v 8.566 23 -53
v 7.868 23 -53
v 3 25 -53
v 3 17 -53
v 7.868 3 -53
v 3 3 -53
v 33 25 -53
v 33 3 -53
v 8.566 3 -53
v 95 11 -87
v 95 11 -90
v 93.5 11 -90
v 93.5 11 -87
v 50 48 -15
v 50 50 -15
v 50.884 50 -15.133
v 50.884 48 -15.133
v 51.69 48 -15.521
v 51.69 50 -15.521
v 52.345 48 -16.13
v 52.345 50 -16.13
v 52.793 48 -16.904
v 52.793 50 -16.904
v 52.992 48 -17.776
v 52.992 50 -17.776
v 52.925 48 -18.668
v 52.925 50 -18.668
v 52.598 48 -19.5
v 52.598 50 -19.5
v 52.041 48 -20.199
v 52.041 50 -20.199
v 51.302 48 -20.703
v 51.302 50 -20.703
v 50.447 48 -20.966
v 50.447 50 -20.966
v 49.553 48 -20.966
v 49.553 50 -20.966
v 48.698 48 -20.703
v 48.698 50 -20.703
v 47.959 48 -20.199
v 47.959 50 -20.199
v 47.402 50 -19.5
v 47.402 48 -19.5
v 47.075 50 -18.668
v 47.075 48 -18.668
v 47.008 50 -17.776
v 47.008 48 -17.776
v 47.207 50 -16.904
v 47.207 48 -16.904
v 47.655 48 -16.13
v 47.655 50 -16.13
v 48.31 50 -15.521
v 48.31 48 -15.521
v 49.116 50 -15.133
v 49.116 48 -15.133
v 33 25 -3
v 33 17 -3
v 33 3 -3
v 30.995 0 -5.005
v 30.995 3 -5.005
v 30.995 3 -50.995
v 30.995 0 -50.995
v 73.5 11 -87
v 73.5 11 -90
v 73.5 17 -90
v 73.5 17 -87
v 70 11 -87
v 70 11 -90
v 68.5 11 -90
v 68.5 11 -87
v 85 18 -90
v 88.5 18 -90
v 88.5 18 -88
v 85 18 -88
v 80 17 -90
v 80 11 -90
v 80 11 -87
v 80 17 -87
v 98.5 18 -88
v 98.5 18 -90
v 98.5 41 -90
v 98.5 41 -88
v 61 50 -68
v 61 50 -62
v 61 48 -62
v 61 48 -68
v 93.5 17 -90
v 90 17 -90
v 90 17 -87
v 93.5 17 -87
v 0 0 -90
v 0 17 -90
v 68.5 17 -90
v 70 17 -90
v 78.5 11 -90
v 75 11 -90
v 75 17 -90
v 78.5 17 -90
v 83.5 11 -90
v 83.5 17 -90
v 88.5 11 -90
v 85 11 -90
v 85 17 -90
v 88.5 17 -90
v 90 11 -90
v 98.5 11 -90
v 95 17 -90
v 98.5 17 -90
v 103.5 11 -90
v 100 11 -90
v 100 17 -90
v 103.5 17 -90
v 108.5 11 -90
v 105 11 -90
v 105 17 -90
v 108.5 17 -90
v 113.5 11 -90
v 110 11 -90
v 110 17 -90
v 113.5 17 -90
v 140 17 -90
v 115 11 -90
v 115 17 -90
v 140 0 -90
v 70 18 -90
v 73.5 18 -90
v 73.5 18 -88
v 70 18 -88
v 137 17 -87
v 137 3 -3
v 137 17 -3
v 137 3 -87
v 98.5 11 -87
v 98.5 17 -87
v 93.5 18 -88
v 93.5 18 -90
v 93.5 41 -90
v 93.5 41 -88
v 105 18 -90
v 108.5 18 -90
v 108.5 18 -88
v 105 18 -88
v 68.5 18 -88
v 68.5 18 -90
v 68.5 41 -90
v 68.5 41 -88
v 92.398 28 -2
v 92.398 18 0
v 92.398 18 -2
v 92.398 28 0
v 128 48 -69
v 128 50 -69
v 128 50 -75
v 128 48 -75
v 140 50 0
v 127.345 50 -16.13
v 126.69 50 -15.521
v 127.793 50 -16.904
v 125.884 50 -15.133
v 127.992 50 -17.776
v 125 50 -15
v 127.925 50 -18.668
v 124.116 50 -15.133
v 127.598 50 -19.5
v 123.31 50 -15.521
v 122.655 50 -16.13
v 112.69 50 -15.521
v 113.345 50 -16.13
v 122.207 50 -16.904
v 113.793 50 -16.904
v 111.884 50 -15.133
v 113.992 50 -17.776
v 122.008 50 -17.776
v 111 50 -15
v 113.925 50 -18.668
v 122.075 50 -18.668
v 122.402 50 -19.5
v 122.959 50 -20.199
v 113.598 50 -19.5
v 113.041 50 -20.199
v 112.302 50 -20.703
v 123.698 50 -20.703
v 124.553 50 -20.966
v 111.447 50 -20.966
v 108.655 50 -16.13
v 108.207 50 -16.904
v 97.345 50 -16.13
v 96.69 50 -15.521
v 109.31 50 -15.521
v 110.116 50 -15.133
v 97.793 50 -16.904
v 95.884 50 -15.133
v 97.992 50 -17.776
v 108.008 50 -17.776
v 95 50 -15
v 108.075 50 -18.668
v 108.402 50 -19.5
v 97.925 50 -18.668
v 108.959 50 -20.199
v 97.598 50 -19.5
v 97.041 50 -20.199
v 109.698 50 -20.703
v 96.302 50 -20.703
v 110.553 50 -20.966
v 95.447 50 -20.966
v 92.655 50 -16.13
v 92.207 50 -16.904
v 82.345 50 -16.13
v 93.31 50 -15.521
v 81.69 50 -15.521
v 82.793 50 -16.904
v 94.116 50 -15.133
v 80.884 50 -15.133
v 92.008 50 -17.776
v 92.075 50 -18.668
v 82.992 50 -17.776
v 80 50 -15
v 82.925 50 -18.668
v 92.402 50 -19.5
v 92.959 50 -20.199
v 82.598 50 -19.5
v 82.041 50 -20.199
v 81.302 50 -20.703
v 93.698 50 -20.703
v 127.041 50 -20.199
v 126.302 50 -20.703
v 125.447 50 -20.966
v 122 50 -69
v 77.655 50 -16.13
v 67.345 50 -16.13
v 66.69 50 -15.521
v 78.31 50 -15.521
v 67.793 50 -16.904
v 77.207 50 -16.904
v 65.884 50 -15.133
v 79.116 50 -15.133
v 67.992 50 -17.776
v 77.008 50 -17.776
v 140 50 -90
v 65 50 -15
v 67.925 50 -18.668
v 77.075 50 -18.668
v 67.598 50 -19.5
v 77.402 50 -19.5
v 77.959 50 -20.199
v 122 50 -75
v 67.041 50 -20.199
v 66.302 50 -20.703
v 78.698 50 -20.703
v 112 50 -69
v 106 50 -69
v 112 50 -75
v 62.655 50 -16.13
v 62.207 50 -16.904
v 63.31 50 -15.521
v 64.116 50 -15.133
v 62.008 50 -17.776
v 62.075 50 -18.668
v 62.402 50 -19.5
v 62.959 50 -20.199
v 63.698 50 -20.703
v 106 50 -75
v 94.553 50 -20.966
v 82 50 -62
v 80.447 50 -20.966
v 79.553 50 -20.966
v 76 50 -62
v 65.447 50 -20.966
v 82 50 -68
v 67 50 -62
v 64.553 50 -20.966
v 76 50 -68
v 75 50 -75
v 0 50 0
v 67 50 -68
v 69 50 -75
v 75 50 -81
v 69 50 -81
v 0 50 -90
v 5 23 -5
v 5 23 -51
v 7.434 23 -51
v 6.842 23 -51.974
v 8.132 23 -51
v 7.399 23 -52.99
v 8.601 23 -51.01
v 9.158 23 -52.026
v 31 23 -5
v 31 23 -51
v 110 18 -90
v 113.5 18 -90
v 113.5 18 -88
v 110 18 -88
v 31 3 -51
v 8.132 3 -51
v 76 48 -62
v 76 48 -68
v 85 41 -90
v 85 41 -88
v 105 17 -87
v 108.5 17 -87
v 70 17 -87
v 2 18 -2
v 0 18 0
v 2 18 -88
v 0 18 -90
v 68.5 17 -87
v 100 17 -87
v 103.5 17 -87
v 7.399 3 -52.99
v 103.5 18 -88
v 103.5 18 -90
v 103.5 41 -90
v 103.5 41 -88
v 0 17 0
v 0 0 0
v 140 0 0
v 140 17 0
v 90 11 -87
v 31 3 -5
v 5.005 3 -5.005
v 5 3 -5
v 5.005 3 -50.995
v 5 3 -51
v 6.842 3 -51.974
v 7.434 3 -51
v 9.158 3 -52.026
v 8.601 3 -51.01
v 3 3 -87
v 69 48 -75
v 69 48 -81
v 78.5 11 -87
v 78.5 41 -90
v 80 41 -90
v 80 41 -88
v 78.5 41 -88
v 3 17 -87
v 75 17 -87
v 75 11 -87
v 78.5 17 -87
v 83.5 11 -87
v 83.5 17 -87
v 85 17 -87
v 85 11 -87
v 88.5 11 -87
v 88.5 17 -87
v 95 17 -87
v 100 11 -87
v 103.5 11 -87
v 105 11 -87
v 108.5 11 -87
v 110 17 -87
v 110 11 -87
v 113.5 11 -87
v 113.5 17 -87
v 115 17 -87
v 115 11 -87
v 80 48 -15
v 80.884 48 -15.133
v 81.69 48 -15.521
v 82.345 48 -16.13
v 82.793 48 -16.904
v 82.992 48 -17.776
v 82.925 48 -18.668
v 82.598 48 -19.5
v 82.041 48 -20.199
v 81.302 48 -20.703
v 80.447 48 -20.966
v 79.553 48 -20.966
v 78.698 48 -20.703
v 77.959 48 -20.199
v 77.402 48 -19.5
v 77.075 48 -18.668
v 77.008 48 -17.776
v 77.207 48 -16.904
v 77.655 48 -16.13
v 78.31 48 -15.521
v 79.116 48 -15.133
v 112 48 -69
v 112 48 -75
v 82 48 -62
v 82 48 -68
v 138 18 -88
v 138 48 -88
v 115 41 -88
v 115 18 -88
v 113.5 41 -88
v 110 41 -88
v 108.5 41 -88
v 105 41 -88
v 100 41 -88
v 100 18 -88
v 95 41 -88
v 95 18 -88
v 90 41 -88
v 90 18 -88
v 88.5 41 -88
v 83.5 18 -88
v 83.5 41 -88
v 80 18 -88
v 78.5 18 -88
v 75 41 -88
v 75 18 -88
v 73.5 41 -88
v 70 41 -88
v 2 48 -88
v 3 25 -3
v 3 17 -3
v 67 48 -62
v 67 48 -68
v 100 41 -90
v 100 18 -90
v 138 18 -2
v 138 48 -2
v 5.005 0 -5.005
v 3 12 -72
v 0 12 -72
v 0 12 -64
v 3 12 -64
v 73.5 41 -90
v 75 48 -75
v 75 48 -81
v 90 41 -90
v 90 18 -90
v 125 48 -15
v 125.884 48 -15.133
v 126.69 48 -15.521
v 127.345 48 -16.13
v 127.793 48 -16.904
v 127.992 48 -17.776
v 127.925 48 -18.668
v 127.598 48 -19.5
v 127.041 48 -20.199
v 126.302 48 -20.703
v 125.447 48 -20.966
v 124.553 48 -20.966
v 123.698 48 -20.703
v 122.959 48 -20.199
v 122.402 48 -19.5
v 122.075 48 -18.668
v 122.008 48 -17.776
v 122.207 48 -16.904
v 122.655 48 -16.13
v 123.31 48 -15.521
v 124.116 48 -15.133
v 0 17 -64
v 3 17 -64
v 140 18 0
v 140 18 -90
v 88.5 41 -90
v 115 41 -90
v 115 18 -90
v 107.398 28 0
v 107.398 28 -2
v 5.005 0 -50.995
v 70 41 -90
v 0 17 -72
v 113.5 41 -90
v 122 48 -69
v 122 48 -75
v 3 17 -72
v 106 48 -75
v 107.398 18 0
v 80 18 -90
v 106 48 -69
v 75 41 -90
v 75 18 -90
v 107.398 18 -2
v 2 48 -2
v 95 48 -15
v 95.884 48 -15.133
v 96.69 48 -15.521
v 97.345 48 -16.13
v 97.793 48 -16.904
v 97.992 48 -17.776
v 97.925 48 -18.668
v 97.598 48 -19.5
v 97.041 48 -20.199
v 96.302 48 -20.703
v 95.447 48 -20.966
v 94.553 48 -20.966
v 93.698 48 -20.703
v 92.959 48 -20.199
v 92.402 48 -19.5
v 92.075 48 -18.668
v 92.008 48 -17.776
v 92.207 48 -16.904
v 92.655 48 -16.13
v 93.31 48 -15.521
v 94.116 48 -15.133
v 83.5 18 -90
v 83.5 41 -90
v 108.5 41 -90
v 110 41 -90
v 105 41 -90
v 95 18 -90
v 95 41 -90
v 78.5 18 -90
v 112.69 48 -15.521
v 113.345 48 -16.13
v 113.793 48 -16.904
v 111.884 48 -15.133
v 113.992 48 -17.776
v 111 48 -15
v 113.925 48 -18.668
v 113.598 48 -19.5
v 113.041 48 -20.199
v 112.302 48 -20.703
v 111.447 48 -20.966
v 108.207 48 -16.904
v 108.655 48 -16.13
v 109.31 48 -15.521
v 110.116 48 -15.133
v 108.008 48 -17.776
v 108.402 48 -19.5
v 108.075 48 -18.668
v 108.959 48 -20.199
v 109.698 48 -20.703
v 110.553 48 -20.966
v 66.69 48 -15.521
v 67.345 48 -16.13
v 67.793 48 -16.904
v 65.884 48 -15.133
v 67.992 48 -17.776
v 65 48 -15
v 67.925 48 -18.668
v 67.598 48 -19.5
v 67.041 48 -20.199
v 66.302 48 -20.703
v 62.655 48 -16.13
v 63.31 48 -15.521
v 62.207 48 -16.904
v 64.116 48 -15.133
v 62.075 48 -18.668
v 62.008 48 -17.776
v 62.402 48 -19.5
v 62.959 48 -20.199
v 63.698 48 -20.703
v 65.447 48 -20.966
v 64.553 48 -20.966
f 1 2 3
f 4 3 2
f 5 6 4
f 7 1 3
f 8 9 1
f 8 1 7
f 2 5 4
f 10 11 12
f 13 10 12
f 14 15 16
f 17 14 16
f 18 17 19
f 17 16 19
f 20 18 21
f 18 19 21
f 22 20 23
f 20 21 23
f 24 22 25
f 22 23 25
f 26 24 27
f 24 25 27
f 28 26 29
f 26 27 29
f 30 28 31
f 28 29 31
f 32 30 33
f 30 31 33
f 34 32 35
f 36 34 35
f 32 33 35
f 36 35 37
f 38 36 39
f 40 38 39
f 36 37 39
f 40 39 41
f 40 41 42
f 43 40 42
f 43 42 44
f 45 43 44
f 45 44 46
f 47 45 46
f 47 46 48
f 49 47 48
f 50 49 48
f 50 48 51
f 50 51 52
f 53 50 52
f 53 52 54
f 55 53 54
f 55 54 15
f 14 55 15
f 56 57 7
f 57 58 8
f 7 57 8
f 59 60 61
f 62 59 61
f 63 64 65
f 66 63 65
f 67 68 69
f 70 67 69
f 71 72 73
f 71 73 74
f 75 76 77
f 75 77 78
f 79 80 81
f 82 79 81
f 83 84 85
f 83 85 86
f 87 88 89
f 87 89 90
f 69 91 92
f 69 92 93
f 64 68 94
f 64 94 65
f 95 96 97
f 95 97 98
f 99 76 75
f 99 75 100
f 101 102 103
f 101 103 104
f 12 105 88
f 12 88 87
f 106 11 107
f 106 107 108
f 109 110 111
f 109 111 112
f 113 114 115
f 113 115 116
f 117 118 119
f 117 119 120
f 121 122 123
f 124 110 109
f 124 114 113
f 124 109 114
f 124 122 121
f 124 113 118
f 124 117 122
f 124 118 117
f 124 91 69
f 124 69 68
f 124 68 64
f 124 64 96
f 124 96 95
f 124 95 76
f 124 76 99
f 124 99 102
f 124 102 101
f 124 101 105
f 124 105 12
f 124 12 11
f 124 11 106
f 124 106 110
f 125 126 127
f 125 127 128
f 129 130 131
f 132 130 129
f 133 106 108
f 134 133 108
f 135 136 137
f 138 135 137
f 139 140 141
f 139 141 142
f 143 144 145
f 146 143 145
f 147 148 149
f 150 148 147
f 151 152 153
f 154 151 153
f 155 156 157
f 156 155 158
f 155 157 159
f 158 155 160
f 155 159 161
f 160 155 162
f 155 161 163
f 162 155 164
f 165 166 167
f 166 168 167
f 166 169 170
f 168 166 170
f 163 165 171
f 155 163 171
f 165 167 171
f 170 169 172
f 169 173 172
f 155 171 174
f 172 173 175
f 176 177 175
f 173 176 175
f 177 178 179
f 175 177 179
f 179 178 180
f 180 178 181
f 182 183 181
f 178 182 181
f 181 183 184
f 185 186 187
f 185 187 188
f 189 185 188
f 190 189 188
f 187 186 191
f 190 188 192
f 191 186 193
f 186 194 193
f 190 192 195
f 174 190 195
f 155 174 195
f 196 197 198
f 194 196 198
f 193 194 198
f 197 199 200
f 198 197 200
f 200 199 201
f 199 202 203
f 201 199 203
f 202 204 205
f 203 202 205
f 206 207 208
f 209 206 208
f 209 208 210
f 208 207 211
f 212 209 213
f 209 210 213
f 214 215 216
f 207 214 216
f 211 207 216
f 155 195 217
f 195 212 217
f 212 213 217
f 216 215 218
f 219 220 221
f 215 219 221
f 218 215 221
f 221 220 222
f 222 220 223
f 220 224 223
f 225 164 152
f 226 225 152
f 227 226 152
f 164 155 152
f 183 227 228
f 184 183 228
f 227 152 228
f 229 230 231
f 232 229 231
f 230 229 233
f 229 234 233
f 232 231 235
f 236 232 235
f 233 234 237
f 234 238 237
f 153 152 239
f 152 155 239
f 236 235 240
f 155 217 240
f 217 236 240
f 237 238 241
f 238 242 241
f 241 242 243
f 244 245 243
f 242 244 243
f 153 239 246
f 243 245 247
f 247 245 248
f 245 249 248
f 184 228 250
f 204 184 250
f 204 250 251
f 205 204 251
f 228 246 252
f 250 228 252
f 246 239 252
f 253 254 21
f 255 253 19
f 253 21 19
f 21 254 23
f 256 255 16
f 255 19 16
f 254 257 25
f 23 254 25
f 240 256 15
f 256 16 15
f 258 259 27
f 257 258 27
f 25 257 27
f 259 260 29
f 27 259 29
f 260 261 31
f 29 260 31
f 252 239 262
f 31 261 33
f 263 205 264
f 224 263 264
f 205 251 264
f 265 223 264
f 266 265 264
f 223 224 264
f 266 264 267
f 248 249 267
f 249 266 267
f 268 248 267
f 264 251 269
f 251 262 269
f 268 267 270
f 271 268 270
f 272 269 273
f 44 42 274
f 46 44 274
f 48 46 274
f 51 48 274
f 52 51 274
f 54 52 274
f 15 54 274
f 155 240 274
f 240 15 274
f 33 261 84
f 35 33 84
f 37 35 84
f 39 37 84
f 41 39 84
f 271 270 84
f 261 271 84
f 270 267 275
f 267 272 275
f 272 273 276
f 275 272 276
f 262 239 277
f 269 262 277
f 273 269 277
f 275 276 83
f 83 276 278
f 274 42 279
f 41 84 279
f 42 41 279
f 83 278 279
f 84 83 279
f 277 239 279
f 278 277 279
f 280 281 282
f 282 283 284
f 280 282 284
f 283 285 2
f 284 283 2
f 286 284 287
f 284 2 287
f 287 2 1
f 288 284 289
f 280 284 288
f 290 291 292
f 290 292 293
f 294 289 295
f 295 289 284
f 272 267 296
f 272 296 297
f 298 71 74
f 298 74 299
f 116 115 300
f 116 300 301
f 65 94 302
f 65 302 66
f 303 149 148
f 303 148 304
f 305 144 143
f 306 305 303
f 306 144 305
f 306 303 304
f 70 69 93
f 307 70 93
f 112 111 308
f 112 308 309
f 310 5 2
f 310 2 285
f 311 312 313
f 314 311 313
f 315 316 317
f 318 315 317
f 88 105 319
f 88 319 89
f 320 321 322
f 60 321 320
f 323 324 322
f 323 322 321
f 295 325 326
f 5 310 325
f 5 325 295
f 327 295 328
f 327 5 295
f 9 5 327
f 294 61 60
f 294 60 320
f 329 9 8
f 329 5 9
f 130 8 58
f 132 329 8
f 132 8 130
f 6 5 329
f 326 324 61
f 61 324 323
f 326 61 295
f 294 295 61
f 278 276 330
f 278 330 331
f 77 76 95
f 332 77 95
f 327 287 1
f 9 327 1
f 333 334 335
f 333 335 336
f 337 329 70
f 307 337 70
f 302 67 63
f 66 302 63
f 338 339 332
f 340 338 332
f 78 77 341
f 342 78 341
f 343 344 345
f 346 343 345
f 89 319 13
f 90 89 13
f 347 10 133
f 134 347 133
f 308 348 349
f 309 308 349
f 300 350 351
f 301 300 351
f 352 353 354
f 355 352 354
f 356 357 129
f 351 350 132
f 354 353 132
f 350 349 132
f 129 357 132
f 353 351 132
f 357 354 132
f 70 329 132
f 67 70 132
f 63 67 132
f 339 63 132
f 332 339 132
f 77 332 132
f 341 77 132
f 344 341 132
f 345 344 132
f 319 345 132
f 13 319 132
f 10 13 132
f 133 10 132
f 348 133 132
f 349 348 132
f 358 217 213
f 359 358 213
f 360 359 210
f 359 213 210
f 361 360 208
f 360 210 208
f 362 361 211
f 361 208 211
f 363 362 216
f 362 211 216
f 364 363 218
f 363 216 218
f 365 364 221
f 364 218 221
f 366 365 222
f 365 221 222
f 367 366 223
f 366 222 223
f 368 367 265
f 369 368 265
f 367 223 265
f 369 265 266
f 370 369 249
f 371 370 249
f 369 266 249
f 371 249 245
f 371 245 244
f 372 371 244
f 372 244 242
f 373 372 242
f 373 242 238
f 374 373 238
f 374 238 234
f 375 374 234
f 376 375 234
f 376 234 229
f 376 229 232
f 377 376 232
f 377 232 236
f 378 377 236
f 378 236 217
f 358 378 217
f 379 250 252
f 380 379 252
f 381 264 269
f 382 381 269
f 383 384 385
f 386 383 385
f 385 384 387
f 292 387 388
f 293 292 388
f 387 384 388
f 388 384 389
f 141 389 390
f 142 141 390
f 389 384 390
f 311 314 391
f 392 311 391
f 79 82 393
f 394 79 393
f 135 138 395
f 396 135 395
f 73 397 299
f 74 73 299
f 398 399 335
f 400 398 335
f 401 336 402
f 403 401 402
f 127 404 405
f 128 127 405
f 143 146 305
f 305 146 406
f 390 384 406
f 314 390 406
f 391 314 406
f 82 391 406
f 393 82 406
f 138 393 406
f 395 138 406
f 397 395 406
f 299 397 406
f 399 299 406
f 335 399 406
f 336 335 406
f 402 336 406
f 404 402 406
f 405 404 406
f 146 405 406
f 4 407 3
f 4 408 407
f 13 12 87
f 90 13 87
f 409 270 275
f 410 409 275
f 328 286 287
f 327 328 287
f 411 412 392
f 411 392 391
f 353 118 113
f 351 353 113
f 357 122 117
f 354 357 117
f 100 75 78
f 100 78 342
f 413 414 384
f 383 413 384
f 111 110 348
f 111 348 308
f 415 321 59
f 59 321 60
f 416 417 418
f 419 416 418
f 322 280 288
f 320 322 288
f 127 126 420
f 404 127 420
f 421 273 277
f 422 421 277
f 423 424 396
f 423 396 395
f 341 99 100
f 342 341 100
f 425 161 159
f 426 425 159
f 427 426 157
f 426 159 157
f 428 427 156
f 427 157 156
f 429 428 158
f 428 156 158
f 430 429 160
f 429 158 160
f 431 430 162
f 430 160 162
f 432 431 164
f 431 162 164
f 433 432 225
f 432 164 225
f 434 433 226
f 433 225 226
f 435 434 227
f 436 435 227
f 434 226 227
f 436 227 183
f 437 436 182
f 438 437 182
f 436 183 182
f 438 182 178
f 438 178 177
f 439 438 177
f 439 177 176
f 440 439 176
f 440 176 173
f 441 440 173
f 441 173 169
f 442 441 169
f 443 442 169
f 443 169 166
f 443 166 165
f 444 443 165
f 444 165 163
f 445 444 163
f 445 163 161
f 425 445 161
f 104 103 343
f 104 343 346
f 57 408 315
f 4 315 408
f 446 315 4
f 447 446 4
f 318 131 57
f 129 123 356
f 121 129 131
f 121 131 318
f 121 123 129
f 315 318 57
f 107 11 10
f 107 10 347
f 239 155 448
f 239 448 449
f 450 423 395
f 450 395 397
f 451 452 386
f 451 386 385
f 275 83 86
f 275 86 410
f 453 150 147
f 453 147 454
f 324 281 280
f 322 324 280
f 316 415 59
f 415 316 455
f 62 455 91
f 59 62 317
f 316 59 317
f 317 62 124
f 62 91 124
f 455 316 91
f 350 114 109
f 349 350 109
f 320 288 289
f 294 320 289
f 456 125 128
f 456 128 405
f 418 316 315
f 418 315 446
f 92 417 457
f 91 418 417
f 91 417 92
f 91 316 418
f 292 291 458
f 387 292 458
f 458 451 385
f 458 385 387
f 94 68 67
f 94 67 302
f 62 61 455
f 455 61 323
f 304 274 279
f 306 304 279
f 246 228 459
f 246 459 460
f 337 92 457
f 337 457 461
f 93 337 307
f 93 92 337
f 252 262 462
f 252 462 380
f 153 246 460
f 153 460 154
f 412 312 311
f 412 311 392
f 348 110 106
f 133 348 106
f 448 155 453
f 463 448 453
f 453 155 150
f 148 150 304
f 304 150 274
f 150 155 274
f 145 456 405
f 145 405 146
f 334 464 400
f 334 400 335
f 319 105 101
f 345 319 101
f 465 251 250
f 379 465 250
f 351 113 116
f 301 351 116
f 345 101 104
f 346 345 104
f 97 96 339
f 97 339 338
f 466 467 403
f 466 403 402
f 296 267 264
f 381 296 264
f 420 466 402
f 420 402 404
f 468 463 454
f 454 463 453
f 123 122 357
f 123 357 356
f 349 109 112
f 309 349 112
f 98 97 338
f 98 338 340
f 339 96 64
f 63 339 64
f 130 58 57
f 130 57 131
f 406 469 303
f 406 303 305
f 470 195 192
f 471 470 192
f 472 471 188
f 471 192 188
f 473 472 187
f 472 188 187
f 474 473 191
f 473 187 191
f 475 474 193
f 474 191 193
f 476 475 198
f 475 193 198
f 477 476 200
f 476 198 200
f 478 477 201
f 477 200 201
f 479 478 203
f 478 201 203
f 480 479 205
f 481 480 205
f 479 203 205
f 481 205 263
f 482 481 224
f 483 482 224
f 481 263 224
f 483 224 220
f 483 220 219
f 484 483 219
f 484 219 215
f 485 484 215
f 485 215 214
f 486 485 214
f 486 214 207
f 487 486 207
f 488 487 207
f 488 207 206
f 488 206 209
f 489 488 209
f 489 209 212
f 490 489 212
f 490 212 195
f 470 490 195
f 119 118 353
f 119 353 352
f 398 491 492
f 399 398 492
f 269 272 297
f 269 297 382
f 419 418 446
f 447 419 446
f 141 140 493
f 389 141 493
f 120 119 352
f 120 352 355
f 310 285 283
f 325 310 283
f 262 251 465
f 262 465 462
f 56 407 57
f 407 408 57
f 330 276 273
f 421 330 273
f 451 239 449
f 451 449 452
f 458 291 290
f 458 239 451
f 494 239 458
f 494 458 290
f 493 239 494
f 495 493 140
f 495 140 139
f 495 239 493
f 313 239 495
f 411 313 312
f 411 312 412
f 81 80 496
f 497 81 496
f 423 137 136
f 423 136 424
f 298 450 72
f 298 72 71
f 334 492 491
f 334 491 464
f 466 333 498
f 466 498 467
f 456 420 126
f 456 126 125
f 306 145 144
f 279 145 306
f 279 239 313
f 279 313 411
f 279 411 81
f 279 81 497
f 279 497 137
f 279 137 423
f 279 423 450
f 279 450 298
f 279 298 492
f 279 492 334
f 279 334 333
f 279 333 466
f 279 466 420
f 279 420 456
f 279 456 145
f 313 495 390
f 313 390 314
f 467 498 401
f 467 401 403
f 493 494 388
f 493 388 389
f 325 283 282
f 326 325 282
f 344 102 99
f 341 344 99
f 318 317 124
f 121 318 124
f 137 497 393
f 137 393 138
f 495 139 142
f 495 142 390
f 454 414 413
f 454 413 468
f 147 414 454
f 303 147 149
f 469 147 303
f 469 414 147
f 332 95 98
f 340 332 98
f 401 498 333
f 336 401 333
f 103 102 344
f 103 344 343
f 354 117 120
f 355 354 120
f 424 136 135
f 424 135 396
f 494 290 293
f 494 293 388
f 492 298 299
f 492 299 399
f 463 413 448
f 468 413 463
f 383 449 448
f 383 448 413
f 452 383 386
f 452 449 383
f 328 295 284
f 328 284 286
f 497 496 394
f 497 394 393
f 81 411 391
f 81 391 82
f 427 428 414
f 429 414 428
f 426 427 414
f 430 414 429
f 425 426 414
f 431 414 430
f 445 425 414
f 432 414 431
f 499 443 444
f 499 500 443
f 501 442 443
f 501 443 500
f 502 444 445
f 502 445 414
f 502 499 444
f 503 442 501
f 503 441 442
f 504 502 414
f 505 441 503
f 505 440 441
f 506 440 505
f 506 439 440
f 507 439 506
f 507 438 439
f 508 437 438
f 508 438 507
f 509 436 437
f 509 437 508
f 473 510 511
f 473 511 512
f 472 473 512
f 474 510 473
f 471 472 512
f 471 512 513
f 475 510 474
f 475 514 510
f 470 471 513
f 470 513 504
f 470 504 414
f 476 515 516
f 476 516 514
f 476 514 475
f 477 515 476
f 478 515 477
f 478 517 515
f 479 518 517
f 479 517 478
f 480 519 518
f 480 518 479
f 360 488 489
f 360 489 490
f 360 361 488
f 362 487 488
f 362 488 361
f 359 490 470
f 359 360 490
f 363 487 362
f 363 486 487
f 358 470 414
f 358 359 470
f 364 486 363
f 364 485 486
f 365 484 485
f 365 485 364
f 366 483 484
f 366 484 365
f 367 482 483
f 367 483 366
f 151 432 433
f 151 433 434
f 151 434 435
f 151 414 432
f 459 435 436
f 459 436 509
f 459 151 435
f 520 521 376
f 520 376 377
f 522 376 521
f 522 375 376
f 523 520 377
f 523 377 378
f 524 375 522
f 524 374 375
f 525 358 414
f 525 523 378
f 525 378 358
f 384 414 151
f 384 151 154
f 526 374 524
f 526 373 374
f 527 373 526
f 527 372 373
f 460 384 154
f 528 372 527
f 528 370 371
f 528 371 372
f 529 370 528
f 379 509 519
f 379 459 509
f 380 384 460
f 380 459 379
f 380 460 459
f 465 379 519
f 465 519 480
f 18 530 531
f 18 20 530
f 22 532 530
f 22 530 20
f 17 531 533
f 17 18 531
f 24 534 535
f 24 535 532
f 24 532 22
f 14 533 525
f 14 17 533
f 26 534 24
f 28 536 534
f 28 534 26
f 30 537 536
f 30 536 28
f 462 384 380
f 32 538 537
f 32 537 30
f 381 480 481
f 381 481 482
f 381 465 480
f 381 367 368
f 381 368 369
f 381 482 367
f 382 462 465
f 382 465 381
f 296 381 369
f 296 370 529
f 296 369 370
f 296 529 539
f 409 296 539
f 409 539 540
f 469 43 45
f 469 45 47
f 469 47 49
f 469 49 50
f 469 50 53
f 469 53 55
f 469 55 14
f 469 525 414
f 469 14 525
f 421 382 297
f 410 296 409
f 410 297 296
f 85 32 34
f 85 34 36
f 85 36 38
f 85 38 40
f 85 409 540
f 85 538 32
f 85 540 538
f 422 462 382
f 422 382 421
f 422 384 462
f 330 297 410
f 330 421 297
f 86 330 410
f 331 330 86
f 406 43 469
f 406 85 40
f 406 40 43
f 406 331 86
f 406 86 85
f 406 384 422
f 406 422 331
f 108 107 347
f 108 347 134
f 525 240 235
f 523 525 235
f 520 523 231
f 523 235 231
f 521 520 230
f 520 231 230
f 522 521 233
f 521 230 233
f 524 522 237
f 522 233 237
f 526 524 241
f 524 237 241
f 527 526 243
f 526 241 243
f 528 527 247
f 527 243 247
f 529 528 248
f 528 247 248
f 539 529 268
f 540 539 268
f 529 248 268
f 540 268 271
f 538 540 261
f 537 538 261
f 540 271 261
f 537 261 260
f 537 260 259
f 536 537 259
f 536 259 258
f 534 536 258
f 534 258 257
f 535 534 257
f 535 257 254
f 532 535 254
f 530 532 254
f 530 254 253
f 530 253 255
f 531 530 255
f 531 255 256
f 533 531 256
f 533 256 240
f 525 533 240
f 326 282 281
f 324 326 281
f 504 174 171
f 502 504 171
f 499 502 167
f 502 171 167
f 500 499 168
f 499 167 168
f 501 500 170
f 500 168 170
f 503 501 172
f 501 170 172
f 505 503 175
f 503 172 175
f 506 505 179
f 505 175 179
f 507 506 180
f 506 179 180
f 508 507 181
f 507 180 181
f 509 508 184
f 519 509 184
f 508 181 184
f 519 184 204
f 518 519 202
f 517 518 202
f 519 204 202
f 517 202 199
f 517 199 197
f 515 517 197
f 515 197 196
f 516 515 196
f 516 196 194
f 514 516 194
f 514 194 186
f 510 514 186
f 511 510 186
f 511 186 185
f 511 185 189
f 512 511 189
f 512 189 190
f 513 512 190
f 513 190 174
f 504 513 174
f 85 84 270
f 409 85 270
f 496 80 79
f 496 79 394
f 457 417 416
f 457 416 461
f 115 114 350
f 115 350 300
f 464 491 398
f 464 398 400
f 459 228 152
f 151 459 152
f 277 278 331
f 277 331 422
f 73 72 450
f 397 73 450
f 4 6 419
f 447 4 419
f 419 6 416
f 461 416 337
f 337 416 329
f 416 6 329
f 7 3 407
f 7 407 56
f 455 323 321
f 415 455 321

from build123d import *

# Parameters (mm, degrees)
SKETCH1_W                  = 140
SKETCH1_H                  = 90
BASE_DEPTH                 = 17
EXTRUDING_BASE_T           = -3
SKETCH3_W                  = 8
SKETCH3_H                  = 5
EXTERNAL_POWER_SPACE_DEPTH = 10
SKETCH6_W                  = 140
SKETCH6_H                  = 90
UPPER_SURFACE_DEPTH        = 32
SHELL12_T                  = -2
SKETCH4_W                  = 30
SKETCH4_H                  = 50
BATTERY_SPACE_DEPTH        = 20
CUT_EXTRUDE3_DEPTH         = 20
CUT_EXTRUDE10_DEPTH        = 20
SKETCH8_R                  = 3
LED_DEPTH                  = 5
SKETCH9_W                  = 15
SKETCH9_H                  = 10
OUTPUT_WIRE_DEPTH          = 5
SKETCH10_W                 = 6
SKETCH10_H                 = 6
PUSHBUTTONS_DEPTH          = 5
SKETCH11_W                 = 1.5
SKETCH11_H                 = 30
AIRFLOW_HOLES_DEPTH        = 5
AIRSUPPORT_COUNT           = 10
AIRSUPPORT_PITCH           = 5
CUT_EXTRUDE9_DEPTH         = 5
SKETCH12_W                 = 30
SKETCH12_H                 = 50
BOSS_EXTRUDE4_DEPTH        = 2


with BuildPart() as part:
    # Sketch1 → Base (new body)
    with BuildSketch(Plane(origin=(0, 0, 0), x_dir=(1, 0, 0), z_dir=(0, 1, 0))):
        with Locations((70, 45)):
            Rectangle(SKETCH1_W, SKETCH1_H)
    extrude(amount=BASE_DEPTH)

    # Extruding Base
    extruding_base_openings = [part.faces().sort_by_distance(p)[0] for p in [
        (70, 17, -45),
    ]]
    offset(amount=EXTRUDING_BASE_T, openings=extruding_base_openings, kind=Kind.INTERSECTION)

    # Sketch3 → External Power Space (cut)
    with BuildSketch(Plane.ZY):
        with Locations((-68, 14.5)):
            Rectangle(SKETCH3_W, SKETCH3_H)
    extrude(amount=-EXTERNAL_POWER_SPACE_DEPTH, mode=Mode.SUBTRACT)

    # Sketch4 → Battery Space (add)
    with BuildSketch(Plane(origin=(0, 3, 0), x_dir=(1, 0, 0), z_dir=(0, 1, 0))):
        with Locations((18, 28)):
            Rectangle(SKETCH4_W, SKETCH4_H)
    extrude(amount=BATTERY_SPACE_DEPTH)

    # 3DSketch1 → Cut-Extrude3 (cut)
    with BuildSketch(Plane(origin=(5, 23, -5), x_dir=(0.49205725666790157, 0, -0.8705628387201345), z_dir=(0, -1, 0))):
        Polygon((0, 0), (12.793488673, 22.634633807), (52.839379254, 0), (40.045890581, -22.634633807), align=None)
    extrude(amount=CUT_EXTRUDE3_DEPTH, mode=Mode.SUBTRACT)

    # Sketch13 → Cut-Extrude10 (cut)
    with BuildSketch(Plane(origin=(0, 23, 0), x_dir=(1, 0, 0), z_dir=(0, 1, 0))):
        Polygon((7.443398723, 50.984772634), (8.600912051, 51.010355471), (9.157513328, 52.025582837), (8.556601277, 53.015227366), (7.399087949, 52.989644529), (6.842486672, 51.974417163), align=None)
    extrude(amount=-CUT_EXTRUDE10_DEPTH, mode=Mode.SUBTRACT)


with BuildPart() as body_2:
    # Sketch6 → Upper Surface (new body)
    with BuildSketch(Plane(origin=(0, 50, 0), x_dir=(-1, 0, 0), z_dir=(0, -1, 0))):
        with Locations((-70, 45)):
            Rectangle(SKETCH6_W, SKETCH6_H)
    extrude(amount=UPPER_SURFACE_DEPTH)

    # Shell12
    shell12_openings = [body_2.faces().sort_by_distance(p)[0] for p in [
        (70, 18, -45),
    ]]
    offset(amount=SHELL12_T, openings=shell12_openings, kind=Kind.INTERSECTION)

    # Sketch8 → LED (cut)
    with BuildSketch(Plane(origin=(0, 50, 0), x_dir=(1, 0, 0), z_dir=(0, 1, 0))):
        with Locations(Location((125, 18, 0), (0, 0, 270))):
            Circle(SKETCH8_R)
        with Locations(Location((111, 18, 0), (0, 0, 270))):
            Circle(SKETCH8_R)
        with Locations(Location((95, 18, 0), (0, 0, 270))):
            Circle(SKETCH8_R)
        with Locations(Location((80, 18, 0), (0, 0, 270))):
            Circle(SKETCH8_R)
        with Locations(Location((65, 18, 0), (0, 0, 270))):
            Circle(SKETCH8_R)
        with Locations(Location((50, 18, 0), (0, 0, 270))):
            Circle(SKETCH8_R)
    extrude(amount=-LED_DEPTH, mode=Mode.SUBTRACT)

    # Sketch9 → OUTPUT Wire (cut)
    with BuildSketch(Plane.XY):
        with Locations((99.897547045, 23)):
            Rectangle(SKETCH9_W, SKETCH9_H)
    extrude(amount=-OUTPUT_WIRE_DEPTH, mode=Mode.SUBTRACT)

    # Sketch10 → PushButtons (cut)
    with BuildSketch(Plane(origin=(0, 50, 0), x_dir=(1, 0, 0), z_dir=(0, 1, 0))):
        with Locations((125, 72)):
            Rectangle(SKETCH10_W, SKETCH10_H)
        with Locations((109, 72)):
            Rectangle(SKETCH10_W, SKETCH10_H)
        with Locations((72, 78)):
            Rectangle(SKETCH10_W, SKETCH10_H)
        with Locations((79, 65)):
            Rectangle(SKETCH10_W, SKETCH10_H)
        with Locations((64, 65)):
            Rectangle(SKETCH10_W, SKETCH10_H)
    extrude(amount=-PUSHBUTTONS_DEPTH, mode=Mode.SUBTRACT)


with BuildPart() as airflow_holes_tool:
    # Sketch11 → AirFlow Holes (new body)
    with BuildSketch(Plane(origin=(0, 0, -90), x_dir=(-1, 0, 0), z_dir=(0, 0, -1))):
        with Locations((-114.25, 26)):
            Rectangle(SKETCH11_W, SKETCH11_H)
    airflow_holes = extrude(amount=-AIRFLOW_HOLES_DEPTH)


with BuildPart() as part_1:
    add(part.part)

    # AirFlow Holes: cut by airflow_holes_tool
    add(airflow_holes_tool.part, mode=Mode.SUBTRACT)


with BuildPart() as body_2_1:
    add(body_2.part)

    # AirFlow Holes: cut by airflow_holes_tool
    add(airflow_holes_tool.part, mode=Mode.SUBTRACT)


with BuildPart() as airsupport_tool:
    # AirSupport: AirFlow Holes ×10
    with Locations(*[(-i * AIRSUPPORT_PITCH, 0, 0) for i in range(1, AIRSUPPORT_COUNT)]):
        add(airflow_holes)


with BuildPart() as part_2:
    add(part_1.part)

    # AirSupport: cut by airsupport_tool
    add(airsupport_tool.part, mode=Mode.SUBTRACT)

    # 3DSketch2 → Cut-Extrude9 (cut)
    with BuildSketch(Plane(origin=(30.995, 3, -5.005), x_dir=(-0.49199487808425185, 0, -0.8705980932318094), z_dir=(0, 1, 0))):
        Polygon((0, 0), (40.038806308, -22.626844443), (52.825753189, 0), (12.786946881, 22.626844443), align=None)
    extrude(amount=-CUT_EXTRUDE9_DEPTH, mode=Mode.SUBTRACT)

    # Sketch12 → Boss-Extrude4 (add)
    with BuildSketch(Plane(origin=(0, 23, 0), x_dir=(1, 0, 0), z_dir=(0, 1, 0))):
        with Locations((18, 28)):
            Rectangle(SKETCH12_W, SKETCH12_H)
    extrude(amount=BOSS_EXTRUDE4_DEPTH)


with BuildPart() as body_2_2:
    add(body_2_1.part)

    # AirSupport: cut by airsupport_tool
    add(airsupport_tool.part, mode=Mode.SUBTRACT)


solid = Compound([part_2.part, body_2_2.part])
